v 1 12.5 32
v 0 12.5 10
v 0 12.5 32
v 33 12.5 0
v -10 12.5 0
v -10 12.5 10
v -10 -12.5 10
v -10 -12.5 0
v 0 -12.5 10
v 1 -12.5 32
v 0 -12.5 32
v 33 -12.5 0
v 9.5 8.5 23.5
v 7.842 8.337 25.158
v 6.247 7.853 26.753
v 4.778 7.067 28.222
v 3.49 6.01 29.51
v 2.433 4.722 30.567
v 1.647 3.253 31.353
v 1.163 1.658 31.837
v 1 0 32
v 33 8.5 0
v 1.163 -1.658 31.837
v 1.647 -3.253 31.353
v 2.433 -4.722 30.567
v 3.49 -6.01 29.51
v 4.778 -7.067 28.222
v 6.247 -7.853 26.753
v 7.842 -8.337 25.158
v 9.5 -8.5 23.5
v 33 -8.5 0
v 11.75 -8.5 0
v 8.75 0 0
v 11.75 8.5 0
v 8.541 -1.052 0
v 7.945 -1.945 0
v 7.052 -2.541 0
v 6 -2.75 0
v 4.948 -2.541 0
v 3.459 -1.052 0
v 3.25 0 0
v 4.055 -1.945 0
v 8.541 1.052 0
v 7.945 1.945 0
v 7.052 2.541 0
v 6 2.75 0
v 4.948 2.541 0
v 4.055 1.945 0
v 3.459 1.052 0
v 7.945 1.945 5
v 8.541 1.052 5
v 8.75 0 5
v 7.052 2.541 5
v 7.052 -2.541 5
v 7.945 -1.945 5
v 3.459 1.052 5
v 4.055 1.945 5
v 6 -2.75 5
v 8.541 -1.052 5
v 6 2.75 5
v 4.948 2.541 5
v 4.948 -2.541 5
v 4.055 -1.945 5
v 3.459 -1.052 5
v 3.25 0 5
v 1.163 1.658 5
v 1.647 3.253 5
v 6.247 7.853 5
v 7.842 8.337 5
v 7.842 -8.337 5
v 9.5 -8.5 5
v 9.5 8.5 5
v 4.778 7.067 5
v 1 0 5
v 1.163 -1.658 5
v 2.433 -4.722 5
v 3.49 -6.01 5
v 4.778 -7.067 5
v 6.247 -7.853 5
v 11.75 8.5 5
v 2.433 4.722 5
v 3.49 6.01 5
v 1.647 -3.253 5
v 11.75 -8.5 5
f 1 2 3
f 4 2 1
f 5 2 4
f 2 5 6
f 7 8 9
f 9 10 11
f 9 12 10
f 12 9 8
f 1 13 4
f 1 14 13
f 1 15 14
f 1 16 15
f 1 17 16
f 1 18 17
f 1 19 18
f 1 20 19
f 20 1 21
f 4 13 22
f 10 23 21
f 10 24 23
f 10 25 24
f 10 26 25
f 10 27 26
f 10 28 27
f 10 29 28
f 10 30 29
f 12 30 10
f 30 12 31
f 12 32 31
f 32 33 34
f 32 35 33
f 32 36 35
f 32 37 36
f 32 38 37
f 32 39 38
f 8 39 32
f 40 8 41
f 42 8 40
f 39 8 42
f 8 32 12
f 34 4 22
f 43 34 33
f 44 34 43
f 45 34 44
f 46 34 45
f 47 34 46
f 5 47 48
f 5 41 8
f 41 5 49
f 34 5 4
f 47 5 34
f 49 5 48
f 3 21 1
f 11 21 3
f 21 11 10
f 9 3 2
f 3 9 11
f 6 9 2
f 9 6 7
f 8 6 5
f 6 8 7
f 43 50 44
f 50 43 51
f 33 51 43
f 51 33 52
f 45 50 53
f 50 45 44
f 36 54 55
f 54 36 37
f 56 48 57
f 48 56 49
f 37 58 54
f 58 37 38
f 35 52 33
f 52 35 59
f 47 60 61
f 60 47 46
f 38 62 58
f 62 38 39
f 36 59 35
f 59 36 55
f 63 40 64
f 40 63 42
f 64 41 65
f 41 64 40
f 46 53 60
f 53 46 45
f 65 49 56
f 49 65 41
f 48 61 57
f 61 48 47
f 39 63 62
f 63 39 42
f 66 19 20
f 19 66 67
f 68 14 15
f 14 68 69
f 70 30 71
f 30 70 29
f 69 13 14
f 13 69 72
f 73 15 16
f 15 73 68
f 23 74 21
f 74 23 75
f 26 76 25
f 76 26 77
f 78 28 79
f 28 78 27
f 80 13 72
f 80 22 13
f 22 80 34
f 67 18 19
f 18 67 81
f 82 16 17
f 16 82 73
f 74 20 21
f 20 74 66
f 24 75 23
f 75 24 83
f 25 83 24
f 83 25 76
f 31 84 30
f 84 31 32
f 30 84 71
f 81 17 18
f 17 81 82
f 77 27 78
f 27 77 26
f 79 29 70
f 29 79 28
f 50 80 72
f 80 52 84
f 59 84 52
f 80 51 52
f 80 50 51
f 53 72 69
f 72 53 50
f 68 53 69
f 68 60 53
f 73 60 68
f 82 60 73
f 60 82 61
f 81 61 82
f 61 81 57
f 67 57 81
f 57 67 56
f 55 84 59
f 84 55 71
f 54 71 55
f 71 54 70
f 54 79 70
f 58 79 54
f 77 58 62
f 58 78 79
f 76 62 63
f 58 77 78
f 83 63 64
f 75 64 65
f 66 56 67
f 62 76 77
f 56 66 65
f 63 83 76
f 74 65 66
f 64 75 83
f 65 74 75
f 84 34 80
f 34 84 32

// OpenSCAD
// file: config.scad
// Paramètres de la machine

decal=-30;            // décallage du chassis xz
hauteur=400;          // hauteur totale chassis
largeur=350;          // largeur totale chassis
longueur=500;         // longueur totale chassis
hauteur_base=90;      // hauteur de la base
entraxe_y=140;        // distance entre les tiges Ø8 axe Y

couleur=[1,0.6,0];



// Paramètre des pièces et jeux

// écart plateau/courroie
// y_belt_holder
belt_h=13;      // écart entre la courroie et le plateau

// écart plateau/tiges lisses
// y_lm8uu
decal_plateau=12; // Décallage en Y

// décallage des tiges lisses Y
// support_tige8_y
decal_tiges=5;

// décallage moteur Y
// y_motor
decal_motory_z=11;
decal_motory_y=25;

// Plats écrous
ec3=5.7;
ec4=7.2;
ec5=8.2;
ec6=10.2;

// Jeu sur plats pour les écrous glissants
jec=0.2;

// hauteur écrous
ec3h=2.4;
ec4h=3.2;
ec5h=4.7;
ec6h=5.2;

// Vis
vis3=3.5;
vis4=4.5;
vis5=5.5;
vis6=6.5;

// nombre de dents des poulies
poulie=20;
// main file
include <config.scad>;
module equerre4(){
  lar=25;   // largeur
  tri=32;   // triangle
  mep=1;    // méplat
  diam=5.5; // diamètre trou
  diam2=17; // diamètre lamage
  ep=5;     // épaisseur
  ec=10;    // écart entre profilés
  lan=10;   // longueur de la languette
  pla=8.5;  // taille écrou sur plats
  pla2=4;   // ep écrou
  vis=5.5;  // diamètre vis de serrage
  pro=30;   // profilé
  tet=10;   // diamètre tête de vis
  
  echo ("equerre4");
  
  color (couleur)
  translate([mep,0,0])
  difference(){
    union(){
      rotate([90,0,0]) linear_extrude(lar, center=true) polygon([[tri,0],[0,tri],[0,0]]);
      translate([-mep,-lar/2,0]) cube([mep,lar,tri]);
      translate([-mep-lan,-lar/2,0]) cube([lan,lar,ec]);
    }
    //vis de fixation
    translate([tet/2,0,-1]) cylinder(h=tri+2, d=diam, $fn=16);
    // lamage
    hull(){
      translate([diam2/2,0,ep]) cylinder(h=tri+2, d=diam2, $fn=32);
      translate([tri,0,ep]) cylinder(h=tri+2, d=diam2, $fn=32);
    }
    // dégagement arrière
    translate([tet/2+diam/2+3,-diam2/2,-1]) cube([tri,diam2,ep+2]);
    // écrou
    /*hull(){
    translate([-mep+1.5,0,ec+pro/2]) rotate([0,90,0]) cylinder(h=pla2, d=pla*2/sqrt(3), $fn=6);
    translate([-mep+1.5,0,tri]) rotate([0,90,0]) cylinder(h=pla2, d=pla*2/sqrt(3), $fn=6);
    }*/
    // vis de serrage
    //translate([-mep-lan-1,0,ec+pro/2]) rotate([0,90,0]) cylinder(h=lan+mep+tri+2, d=vis, $fn=16);
  }
}

equerre4();
